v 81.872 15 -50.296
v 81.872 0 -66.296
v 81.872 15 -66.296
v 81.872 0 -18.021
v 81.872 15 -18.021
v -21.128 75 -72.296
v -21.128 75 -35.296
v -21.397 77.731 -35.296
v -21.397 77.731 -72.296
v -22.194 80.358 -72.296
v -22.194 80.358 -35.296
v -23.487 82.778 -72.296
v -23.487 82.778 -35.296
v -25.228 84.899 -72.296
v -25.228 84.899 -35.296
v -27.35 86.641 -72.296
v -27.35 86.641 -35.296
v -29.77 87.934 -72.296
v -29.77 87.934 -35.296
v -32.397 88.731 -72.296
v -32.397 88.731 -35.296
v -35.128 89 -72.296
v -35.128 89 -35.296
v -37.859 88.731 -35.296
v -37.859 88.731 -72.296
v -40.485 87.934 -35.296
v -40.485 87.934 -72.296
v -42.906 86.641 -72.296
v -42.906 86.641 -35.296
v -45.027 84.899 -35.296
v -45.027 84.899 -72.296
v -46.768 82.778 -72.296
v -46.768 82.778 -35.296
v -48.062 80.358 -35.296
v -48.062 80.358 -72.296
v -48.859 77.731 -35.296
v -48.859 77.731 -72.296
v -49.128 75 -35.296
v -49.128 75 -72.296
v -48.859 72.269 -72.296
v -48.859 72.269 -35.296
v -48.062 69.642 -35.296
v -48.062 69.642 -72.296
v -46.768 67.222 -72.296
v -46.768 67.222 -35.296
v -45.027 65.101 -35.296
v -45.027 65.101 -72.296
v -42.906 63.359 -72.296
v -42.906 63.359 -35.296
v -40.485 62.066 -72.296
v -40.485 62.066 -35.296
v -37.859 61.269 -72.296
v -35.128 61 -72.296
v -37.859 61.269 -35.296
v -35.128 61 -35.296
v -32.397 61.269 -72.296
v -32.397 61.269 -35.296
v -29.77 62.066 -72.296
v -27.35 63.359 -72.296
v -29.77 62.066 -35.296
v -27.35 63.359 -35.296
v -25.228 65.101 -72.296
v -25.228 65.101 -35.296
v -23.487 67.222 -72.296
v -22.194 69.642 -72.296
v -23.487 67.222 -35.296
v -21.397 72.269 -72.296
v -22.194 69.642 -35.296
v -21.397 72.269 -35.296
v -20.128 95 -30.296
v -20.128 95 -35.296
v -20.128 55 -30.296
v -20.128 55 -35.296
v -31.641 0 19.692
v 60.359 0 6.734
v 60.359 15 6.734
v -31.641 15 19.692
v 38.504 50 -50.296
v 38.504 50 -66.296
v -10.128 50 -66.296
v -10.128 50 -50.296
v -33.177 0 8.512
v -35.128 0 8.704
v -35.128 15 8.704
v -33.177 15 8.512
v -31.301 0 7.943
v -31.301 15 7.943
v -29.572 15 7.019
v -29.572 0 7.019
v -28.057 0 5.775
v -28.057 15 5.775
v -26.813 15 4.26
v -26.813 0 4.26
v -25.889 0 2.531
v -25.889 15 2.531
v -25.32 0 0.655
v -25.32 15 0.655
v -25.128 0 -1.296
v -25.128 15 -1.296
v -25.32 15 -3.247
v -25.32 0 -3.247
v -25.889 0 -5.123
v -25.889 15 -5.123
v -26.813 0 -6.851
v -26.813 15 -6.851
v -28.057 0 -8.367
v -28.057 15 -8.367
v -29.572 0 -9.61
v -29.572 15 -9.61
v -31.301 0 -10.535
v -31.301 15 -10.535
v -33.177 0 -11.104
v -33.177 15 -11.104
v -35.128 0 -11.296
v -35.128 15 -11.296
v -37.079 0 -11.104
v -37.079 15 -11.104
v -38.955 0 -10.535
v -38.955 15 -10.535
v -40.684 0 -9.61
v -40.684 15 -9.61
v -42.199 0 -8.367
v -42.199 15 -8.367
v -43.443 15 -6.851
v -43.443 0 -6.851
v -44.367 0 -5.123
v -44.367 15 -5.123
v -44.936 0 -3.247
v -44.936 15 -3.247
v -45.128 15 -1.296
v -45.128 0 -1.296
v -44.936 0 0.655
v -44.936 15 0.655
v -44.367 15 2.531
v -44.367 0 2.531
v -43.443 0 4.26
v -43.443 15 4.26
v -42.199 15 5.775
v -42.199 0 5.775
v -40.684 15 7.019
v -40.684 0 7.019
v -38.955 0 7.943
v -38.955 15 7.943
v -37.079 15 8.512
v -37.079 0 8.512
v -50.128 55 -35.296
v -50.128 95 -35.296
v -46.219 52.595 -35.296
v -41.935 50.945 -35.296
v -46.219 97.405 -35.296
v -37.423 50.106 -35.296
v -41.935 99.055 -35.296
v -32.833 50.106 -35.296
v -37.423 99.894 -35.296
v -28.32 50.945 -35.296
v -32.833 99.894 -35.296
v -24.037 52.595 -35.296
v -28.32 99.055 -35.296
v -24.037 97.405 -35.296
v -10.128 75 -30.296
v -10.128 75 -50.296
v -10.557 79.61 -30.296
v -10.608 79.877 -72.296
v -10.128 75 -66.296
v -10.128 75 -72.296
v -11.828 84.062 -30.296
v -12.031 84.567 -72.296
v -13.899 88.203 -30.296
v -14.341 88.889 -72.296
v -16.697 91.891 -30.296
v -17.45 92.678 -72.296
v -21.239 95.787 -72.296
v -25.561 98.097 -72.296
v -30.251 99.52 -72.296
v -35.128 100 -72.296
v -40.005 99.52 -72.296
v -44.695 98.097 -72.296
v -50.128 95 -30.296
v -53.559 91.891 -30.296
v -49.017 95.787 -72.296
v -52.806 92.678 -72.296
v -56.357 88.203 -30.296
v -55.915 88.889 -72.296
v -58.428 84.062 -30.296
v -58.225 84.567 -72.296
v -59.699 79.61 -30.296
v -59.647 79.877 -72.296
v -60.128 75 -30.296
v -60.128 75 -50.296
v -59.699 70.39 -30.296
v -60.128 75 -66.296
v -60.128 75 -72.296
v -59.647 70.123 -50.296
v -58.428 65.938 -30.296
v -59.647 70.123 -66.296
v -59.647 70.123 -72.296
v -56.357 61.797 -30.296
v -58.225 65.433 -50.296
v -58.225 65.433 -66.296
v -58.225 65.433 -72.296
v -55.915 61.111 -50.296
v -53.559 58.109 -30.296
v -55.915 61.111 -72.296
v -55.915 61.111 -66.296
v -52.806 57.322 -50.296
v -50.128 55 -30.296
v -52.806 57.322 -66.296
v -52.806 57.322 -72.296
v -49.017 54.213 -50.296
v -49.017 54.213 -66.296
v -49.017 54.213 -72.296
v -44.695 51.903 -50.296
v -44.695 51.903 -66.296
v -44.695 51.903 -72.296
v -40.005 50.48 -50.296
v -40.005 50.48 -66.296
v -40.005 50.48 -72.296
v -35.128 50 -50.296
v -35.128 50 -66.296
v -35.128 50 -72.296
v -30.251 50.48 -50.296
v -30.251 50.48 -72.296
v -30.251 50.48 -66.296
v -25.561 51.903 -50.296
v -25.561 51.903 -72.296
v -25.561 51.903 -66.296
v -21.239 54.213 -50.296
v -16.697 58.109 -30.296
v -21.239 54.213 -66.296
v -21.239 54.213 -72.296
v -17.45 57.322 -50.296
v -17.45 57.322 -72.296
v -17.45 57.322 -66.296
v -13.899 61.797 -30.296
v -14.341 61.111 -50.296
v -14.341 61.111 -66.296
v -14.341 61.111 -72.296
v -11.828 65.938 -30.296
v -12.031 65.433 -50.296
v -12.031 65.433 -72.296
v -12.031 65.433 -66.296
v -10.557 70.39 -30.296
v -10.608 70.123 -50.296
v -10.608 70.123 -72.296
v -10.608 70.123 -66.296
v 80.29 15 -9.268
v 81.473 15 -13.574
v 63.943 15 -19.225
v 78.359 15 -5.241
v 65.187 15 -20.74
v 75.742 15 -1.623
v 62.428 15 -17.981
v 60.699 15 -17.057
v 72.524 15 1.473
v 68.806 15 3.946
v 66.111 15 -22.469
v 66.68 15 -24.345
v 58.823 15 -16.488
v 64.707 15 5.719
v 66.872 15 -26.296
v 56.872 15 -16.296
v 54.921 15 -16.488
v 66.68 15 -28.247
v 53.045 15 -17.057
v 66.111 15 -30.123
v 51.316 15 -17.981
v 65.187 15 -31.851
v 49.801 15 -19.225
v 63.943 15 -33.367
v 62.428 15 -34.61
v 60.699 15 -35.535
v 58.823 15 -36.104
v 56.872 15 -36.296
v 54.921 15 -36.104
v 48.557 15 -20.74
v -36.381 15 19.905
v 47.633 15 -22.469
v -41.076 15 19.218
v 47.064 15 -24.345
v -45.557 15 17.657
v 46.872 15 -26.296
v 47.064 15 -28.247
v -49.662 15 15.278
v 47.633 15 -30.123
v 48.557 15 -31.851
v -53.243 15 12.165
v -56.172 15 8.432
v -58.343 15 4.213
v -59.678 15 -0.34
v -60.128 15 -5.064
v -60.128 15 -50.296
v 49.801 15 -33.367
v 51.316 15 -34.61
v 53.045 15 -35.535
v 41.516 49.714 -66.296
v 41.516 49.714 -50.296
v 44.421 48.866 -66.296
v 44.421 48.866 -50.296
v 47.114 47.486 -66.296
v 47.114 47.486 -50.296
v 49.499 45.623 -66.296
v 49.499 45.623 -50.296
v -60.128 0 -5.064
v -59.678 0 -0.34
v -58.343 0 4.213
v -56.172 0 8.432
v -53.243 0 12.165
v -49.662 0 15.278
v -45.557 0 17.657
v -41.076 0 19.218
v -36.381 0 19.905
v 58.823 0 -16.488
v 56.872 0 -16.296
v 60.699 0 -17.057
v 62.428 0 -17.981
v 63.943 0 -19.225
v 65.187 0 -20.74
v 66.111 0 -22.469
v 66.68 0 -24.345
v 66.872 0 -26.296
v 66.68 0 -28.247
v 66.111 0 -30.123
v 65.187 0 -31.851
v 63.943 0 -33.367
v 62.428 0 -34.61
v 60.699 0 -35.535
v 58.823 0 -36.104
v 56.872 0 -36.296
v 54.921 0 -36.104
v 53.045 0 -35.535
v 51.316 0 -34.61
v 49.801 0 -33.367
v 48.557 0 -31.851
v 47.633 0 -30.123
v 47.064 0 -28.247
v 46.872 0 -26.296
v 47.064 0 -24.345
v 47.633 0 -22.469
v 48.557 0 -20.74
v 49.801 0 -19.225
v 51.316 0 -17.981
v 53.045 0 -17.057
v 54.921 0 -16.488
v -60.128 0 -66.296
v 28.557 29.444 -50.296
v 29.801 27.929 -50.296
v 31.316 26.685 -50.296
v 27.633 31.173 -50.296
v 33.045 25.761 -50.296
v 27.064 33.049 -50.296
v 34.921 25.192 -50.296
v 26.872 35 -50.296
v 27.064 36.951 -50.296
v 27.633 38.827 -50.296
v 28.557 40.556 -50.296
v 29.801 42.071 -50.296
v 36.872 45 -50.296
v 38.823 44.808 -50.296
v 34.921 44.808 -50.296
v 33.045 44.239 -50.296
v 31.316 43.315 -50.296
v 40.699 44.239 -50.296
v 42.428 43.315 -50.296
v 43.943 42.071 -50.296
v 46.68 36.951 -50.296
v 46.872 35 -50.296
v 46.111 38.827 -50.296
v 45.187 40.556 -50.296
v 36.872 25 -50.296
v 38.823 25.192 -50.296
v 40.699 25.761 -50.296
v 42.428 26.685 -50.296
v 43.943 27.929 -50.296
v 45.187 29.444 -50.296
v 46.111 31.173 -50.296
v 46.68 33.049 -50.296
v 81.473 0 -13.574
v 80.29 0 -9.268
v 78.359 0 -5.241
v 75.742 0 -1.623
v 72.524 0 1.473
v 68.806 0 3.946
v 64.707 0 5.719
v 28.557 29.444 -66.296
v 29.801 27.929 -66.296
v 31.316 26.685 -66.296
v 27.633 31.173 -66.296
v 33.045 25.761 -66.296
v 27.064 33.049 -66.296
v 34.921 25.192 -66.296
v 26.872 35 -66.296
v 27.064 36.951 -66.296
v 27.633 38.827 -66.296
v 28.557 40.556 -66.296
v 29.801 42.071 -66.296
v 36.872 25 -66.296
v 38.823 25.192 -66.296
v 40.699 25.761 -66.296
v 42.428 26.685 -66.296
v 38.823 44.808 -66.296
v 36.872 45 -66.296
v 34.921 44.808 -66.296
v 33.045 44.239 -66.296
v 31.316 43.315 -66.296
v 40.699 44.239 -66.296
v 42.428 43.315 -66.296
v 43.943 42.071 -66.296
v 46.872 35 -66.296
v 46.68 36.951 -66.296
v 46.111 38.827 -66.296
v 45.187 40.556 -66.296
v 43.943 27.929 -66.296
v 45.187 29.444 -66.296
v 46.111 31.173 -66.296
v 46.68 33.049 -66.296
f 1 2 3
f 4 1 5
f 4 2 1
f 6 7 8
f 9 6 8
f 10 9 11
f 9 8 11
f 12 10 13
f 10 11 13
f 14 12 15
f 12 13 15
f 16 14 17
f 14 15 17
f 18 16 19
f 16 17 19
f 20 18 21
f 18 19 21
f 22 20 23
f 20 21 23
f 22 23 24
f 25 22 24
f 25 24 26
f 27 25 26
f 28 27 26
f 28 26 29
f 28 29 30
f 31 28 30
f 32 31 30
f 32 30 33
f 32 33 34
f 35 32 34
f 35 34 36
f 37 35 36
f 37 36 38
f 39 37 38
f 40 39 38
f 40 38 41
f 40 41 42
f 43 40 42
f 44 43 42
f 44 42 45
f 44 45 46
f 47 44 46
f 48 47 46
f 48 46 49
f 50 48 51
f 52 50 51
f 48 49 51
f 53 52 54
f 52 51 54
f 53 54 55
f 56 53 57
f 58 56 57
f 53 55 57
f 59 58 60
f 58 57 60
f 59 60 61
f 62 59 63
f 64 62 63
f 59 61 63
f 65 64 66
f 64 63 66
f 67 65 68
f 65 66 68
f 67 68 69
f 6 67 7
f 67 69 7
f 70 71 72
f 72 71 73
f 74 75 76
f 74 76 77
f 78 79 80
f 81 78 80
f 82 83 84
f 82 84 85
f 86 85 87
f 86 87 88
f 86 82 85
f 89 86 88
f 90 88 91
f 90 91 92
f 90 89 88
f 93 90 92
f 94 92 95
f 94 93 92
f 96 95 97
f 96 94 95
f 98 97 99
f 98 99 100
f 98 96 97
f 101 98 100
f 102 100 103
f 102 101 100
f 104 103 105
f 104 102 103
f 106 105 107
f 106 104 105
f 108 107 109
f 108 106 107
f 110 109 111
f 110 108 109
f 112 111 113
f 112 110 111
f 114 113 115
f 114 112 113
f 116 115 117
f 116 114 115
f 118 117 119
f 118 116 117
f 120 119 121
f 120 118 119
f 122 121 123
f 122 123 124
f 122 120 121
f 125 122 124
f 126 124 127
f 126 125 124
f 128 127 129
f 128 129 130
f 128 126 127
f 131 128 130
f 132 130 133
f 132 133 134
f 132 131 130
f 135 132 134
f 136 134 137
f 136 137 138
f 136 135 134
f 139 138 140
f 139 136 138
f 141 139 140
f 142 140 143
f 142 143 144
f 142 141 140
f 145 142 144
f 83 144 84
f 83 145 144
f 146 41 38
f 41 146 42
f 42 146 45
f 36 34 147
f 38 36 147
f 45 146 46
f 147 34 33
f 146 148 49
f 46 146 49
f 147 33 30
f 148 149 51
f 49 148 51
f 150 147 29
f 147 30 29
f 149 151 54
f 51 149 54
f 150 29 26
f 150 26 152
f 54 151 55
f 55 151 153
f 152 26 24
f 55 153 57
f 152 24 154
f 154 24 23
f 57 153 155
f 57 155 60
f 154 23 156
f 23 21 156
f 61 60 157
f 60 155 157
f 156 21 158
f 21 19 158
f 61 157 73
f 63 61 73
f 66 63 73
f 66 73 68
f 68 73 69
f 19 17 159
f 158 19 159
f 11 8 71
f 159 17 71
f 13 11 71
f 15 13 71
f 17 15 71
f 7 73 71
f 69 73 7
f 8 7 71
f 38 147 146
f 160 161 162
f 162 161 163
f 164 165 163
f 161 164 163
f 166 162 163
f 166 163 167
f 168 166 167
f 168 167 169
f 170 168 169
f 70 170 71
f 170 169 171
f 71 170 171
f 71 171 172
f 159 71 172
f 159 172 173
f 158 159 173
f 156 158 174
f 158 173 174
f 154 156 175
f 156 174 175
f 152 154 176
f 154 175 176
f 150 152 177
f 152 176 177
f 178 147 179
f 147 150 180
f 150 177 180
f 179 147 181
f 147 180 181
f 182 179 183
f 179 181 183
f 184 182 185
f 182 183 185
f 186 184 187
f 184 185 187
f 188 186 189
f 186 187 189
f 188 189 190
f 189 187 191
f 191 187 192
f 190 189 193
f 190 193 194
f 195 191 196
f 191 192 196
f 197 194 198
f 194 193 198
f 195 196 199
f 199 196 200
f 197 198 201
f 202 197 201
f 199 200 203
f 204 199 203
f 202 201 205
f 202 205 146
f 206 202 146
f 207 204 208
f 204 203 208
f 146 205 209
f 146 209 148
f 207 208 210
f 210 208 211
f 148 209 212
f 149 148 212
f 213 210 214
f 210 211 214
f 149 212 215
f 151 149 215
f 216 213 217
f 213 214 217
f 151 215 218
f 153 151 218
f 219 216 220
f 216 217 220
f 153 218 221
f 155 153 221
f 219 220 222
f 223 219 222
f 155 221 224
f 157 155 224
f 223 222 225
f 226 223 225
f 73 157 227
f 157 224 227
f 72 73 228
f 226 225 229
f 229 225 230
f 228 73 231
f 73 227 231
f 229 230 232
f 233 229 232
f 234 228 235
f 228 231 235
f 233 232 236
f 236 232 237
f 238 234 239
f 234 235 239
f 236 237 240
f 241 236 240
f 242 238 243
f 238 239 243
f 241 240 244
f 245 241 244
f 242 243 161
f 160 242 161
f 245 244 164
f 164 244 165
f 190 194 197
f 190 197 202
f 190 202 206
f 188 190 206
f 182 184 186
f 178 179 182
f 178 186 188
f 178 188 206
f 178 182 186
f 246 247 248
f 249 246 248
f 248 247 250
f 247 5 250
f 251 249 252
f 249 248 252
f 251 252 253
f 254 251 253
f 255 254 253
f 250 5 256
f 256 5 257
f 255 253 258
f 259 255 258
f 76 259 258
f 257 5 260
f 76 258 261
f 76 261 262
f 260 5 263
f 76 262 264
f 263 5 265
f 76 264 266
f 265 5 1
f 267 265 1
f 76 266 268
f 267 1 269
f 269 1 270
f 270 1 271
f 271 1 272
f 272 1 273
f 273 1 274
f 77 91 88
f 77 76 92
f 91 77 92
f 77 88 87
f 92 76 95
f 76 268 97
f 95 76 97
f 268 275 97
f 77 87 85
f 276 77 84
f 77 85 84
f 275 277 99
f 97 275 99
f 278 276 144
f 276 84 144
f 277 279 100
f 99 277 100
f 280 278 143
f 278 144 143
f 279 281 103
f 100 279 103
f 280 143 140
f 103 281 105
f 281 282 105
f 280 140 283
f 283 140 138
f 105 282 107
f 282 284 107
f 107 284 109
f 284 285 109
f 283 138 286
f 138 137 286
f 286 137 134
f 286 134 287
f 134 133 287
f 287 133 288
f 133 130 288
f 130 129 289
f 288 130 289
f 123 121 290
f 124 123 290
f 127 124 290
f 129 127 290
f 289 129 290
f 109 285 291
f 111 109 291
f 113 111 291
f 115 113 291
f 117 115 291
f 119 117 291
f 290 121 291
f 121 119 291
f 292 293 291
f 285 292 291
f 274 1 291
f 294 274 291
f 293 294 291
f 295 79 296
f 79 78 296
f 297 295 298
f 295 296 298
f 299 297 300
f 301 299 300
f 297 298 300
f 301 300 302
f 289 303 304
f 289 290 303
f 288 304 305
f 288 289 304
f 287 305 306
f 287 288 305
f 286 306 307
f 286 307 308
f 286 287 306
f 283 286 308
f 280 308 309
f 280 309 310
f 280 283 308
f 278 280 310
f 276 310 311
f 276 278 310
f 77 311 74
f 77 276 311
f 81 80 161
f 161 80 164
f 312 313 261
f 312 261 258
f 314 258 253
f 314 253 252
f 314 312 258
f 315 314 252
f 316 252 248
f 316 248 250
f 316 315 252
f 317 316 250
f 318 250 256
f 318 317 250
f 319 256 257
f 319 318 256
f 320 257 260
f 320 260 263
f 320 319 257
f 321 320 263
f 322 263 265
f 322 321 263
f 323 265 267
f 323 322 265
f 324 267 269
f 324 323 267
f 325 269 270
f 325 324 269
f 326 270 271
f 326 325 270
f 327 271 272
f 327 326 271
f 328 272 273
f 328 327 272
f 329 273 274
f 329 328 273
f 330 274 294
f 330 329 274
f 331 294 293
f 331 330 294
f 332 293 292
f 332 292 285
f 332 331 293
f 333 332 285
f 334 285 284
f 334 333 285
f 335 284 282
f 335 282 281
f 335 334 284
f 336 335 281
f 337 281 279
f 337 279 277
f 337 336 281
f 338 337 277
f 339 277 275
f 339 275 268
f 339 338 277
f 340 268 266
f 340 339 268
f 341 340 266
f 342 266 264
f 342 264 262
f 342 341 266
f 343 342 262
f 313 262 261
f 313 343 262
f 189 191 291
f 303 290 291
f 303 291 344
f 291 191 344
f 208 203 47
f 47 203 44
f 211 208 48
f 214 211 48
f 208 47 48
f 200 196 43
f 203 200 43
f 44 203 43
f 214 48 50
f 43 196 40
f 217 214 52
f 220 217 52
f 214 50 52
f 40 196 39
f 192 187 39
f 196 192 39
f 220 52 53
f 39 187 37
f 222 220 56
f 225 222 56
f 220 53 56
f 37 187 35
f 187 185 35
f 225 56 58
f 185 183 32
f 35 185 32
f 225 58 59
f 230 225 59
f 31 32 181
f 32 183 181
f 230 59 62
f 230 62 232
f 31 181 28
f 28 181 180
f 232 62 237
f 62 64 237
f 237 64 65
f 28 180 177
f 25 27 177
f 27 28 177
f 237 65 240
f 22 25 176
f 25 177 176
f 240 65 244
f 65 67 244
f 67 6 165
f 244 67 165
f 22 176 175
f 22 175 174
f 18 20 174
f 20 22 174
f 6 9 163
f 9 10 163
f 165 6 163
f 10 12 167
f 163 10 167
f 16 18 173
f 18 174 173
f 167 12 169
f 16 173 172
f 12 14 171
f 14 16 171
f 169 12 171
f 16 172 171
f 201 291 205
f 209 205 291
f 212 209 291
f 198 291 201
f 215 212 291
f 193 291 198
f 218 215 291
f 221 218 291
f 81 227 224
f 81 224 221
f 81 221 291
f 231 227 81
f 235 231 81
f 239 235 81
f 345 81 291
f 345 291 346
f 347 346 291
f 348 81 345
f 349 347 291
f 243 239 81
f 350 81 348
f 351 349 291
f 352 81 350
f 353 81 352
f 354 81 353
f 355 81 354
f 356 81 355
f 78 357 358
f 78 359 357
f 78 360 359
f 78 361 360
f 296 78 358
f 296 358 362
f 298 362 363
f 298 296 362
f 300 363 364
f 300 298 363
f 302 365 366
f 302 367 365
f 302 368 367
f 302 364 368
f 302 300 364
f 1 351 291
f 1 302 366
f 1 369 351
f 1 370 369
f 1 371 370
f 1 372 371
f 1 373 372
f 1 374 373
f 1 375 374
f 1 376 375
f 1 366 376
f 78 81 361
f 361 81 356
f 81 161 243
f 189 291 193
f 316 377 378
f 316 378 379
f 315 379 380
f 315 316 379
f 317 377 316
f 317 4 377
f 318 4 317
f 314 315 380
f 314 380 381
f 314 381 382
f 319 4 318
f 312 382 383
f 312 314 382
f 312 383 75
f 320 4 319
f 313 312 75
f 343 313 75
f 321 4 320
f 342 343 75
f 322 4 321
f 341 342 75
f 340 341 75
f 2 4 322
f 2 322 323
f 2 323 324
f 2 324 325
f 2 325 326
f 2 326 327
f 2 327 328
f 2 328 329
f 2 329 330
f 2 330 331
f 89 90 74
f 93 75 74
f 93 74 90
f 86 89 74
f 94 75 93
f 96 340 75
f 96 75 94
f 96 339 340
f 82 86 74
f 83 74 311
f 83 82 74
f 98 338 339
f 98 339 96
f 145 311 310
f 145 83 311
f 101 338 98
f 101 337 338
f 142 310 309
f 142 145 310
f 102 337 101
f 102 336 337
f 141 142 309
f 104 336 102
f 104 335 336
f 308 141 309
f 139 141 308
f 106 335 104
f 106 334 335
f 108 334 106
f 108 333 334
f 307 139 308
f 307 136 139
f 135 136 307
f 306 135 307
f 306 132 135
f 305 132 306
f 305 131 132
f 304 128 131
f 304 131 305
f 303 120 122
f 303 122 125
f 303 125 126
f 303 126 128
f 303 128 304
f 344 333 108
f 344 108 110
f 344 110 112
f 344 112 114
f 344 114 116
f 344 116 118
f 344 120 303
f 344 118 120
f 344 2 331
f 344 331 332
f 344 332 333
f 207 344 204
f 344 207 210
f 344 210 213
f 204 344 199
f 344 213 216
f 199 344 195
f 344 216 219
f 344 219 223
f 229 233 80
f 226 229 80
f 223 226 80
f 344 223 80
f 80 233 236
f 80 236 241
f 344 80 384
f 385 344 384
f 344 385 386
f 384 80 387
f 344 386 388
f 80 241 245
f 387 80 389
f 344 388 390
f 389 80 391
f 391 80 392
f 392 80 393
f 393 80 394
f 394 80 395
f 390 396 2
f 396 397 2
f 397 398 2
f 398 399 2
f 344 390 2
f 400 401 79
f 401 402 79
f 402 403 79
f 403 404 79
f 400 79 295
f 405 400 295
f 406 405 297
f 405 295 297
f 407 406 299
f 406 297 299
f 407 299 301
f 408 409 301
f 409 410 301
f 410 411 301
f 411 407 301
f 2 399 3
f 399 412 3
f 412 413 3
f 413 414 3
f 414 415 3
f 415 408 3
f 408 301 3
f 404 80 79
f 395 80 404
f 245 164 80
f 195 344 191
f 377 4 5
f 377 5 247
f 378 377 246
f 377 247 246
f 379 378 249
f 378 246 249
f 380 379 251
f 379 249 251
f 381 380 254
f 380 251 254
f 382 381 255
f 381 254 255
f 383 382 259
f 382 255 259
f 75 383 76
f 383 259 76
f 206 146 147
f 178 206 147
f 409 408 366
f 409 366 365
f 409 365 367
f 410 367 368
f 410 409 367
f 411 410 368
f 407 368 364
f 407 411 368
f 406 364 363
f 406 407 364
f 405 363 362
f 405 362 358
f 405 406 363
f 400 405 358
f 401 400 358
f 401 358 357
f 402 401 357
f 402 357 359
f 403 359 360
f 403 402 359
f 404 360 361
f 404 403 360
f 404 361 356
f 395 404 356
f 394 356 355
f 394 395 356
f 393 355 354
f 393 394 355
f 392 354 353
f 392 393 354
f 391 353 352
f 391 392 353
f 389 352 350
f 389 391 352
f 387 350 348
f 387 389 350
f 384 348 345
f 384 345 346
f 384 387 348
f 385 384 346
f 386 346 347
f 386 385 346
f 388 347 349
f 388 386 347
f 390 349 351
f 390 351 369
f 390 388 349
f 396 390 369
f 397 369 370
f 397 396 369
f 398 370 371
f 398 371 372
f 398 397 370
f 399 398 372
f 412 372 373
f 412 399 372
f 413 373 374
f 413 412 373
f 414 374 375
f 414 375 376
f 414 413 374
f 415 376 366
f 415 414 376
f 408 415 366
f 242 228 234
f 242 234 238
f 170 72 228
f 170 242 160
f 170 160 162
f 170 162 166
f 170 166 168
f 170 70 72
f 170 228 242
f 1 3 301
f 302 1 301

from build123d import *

# Parameters (mm, degrees)
SKETCH1_R               = 10
BOSS_EXTRUDE2_DEPTH     = 15
FILLET3_R               = 25
F_3DSKETCH1_R           = 10
BOSS_EXTRUDE5_DEPTH     = 16
FILLET5_R               = 16
BOSS_EXTRUDE6_START     = -72.295744394
BOSS_EXTRUDE6_OUTLINE_R = 25
BOSS_EXTRUDE6_DEPTH     = 42
SKETCH2_R               = 14
CUT_EXTRUDE1_DEPTH      = 56
CUT_EXTRUDE2_START      = -5
CUT_EXTRUDE2_DEPTH      = 5


# Read off the part's stored shape, not the designer's step: Boss-Extrude6
with BuildPart() as part:
    # Sketch1 → Boss-Extrude2 (new body)
    with BuildSketch(Plane(origin=(0, 0, 0), x_dir=(1, 0, 0), z_dir=(0, 1, 0))):
        Polygon((-60.127867878, 66.295744394), (81.872132122, 66.295744394), (81.872132122, -3.704255606), (-60.127867878, -23.704255606), align=None)
        with Locations(Location((-35.127867878, 1.295744394, 0), (0, 0, 270))):
            Circle(SKETCH1_R, mode=Mode.SUBTRACT)
        with Locations(Location((56.872132122, 26.295744394, 0), (0, 0, 270))):
            Circle(SKETCH1_R, mode=Mode.SUBTRACT)
    extrude(amount=BOSS_EXTRUDE2_DEPTH)

    # Fillet3
    fillet3_edges = [part.edges().sort_by_distance(p)[0] for p in [
        (81.872132122, 7.5, 3.704255606),
        (-60.127867878, 7.5, 23.704255606),
    ]]
    fillet(fillet3_edges, radius=FILLET3_R)

    # 3DSketch1 → Boss-Extrude5 (add)
    with BuildSketch(Plane(origin=(-60.127867878, 15, -66.295744394), x_dir=(1, 0, 0), z_dir=(0, 0, 1))):
        Polygon((0, 0), (142, 0), (105, 35), (50, 35), (50, 60), (0, 60), align=None)
        with Locations((97, 20)):
            Circle(F_3DSKETCH1_R, mode=Mode.SUBTRACT)
    extrude(amount=BOSS_EXTRUDE5_DEPTH)

    # Fillet5
    fillet5_edges = [part.edges().sort_by_distance(p)[0] for p in [
        (44.872132122, 50, -58.295744394),
    ]]
    fillet(fillet5_edges, radius=FILLET5_R)

    # Boss-Extrude6 outline → Boss-Extrude6 (add)
    with BuildSketch(Plane.XY.offset(BOSS_EXTRUDE6_START)):
        with Locations((-35.127867878, 75)):
            Circle(BOSS_EXTRUDE6_OUTLINE_R)
    extrude(amount=BOSS_EXTRUDE6_DEPTH)

    # Sketch2 → Cut-Extrude1 (cut)
    with BuildSketch(Plane.XY.offset(-30.295744394)):
        with Locations((-35.127867878, 75)):
            Circle(SKETCH2_R)
    extrude(amount=-CUT_EXTRUDE1_DEPTH, mode=Mode.SUBTRACT)

    # 3DSketch3 → Cut-Extrude2 (cut)
    with BuildSketch(Plane(origin=(-20.127867878, 95, -30.295744394), x_dir=(-0.5999999999999998, -0.8000000000000002, 0), z_dir=(0, 0, 1)).offset(CUT_EXTRUDE2_START)):
        with BuildLine():
            Line((0, 0), (32, 24))
            ThreePointArc((32, 24), (45, 15), (50, 0))
            Line((50, 0), (18, -24))
            ThreePointArc((18, -24), (5, -15), (0, 0))
        make_face()
    extrude(amount=CUT_EXTRUDE2_DEPTH, mode=Mode.SUBTRACT)


solid = part.part
